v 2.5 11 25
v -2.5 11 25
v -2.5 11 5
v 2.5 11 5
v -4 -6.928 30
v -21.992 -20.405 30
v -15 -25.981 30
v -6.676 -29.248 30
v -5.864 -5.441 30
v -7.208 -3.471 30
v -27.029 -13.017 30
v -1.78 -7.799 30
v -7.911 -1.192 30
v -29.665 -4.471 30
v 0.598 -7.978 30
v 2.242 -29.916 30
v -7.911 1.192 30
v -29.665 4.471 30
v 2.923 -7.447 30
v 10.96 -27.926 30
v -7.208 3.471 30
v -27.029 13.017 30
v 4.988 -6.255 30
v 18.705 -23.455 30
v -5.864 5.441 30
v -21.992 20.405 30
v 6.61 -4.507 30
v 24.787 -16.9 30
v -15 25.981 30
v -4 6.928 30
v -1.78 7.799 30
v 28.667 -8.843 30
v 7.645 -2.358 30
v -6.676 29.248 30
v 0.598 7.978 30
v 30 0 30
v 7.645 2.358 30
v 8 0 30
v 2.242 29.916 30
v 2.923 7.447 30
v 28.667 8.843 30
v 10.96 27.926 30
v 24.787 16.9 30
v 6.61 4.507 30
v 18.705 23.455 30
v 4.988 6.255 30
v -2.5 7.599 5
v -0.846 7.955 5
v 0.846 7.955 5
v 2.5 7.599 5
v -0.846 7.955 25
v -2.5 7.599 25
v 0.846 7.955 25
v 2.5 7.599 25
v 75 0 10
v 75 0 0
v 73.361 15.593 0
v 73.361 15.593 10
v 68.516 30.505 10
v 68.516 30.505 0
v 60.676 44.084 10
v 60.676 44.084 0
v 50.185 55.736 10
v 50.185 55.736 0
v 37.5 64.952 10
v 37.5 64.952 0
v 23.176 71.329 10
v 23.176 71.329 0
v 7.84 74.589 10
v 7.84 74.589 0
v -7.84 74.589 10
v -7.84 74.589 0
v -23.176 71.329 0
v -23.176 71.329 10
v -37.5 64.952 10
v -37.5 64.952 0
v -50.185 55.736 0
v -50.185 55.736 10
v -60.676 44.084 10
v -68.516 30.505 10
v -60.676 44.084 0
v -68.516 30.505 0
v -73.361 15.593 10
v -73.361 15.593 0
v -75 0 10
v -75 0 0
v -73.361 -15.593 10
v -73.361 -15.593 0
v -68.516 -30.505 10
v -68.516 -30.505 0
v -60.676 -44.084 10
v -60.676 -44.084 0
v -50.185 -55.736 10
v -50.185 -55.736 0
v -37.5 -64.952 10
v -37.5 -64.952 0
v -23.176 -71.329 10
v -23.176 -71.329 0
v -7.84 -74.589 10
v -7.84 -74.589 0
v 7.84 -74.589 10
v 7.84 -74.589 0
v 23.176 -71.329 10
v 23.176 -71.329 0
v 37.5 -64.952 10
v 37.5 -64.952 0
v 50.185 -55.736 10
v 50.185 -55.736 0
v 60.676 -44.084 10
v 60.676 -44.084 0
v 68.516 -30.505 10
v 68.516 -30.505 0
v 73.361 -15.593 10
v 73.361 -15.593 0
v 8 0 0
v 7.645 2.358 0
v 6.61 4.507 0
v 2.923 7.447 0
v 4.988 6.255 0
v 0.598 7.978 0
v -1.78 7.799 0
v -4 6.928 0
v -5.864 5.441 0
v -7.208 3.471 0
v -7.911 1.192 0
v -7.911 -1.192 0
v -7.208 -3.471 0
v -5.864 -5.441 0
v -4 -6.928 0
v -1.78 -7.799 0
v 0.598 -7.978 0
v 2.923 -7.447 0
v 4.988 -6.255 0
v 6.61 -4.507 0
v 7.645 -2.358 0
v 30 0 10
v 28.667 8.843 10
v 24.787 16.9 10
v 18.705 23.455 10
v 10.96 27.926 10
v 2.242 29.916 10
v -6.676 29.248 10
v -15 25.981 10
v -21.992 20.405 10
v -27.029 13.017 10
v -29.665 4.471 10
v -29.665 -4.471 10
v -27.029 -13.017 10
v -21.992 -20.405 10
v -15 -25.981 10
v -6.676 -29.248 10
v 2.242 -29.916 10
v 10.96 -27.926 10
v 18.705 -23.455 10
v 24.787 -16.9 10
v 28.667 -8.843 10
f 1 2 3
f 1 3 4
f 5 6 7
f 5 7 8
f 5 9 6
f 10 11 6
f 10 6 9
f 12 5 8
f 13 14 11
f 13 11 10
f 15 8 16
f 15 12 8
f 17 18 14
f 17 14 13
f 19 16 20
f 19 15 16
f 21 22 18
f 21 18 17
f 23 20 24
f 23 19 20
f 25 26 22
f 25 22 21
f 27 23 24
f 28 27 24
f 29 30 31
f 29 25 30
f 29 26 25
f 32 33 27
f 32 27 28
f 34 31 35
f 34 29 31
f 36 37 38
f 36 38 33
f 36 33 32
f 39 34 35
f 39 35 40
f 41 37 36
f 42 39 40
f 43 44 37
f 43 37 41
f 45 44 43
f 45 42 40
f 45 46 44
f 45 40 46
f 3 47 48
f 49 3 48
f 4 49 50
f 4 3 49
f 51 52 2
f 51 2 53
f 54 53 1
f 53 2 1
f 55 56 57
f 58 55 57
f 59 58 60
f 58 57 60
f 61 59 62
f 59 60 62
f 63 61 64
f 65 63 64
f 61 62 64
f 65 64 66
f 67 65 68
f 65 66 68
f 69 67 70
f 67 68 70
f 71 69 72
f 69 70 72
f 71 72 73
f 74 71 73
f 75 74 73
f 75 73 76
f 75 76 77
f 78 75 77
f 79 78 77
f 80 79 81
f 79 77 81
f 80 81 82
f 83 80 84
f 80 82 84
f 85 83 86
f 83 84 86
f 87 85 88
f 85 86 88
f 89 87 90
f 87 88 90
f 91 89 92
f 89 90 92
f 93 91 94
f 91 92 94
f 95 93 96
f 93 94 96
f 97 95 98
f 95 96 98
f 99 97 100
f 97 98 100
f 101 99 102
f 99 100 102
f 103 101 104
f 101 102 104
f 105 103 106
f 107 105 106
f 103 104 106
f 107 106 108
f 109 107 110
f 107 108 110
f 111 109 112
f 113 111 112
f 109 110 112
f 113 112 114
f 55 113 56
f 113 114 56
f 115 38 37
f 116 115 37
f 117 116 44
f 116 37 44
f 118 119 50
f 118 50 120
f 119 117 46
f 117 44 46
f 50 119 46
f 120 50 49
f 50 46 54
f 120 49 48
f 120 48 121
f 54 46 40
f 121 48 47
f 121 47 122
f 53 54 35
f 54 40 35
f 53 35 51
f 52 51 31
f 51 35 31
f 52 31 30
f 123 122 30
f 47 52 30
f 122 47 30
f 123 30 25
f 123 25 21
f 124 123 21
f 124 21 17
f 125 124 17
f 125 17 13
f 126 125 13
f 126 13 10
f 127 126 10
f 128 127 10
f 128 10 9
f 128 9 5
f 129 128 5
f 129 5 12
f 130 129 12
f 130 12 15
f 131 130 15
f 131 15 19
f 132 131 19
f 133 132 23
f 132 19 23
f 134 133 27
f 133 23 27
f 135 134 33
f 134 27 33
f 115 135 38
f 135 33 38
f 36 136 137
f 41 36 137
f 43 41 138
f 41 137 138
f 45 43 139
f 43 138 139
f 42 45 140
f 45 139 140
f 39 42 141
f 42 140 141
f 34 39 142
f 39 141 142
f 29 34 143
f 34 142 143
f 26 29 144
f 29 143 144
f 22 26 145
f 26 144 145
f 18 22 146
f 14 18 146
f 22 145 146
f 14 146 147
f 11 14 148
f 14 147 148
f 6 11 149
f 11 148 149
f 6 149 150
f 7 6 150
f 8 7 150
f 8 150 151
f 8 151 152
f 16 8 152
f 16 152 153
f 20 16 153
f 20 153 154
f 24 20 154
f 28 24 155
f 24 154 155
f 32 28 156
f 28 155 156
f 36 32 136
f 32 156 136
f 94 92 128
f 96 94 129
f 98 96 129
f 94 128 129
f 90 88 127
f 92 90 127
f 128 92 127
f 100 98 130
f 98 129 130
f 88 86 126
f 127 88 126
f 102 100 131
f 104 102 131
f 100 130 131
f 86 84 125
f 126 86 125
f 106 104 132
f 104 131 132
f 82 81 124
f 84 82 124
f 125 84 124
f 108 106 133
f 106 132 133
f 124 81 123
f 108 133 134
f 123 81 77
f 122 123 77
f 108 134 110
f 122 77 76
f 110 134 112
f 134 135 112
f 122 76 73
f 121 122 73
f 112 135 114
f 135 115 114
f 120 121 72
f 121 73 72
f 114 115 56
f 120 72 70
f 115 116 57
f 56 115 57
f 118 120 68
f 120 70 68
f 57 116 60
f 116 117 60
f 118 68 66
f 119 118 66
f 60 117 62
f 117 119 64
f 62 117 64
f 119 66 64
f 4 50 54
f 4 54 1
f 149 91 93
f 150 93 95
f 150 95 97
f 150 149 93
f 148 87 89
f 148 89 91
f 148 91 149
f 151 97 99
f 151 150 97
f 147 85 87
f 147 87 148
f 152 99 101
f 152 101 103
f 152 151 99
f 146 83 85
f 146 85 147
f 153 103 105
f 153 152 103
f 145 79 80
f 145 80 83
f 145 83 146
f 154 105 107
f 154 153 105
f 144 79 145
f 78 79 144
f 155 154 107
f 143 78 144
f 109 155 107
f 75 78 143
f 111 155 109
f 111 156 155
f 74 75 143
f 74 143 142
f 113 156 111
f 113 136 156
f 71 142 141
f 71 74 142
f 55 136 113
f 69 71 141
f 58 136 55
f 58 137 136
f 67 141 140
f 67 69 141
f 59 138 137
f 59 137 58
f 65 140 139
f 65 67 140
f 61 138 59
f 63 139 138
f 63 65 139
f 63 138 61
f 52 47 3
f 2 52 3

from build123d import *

# Parameters (mm, degrees)
SKETCH1_R           = 75
BOSS_EXTRUDE1_DEPTH = 10
SKETCH2_R           = 30
BOSS_EXTRUDE2_DEPTH = 20
SKETCH3_R           = 8
CUT_EXTRUDE1_DEPTH  = 111.227038425
CUT_EXTRUDE2_START  = -5
SKETCH4_W           = 5
SKETCH4_H           = 6
CUT_EXTRUDE2_DEPTH  = 20


with BuildPart() as part:
    # Sketch1 → Boss-Extrude1 (new body)
    with BuildSketch(Plane.XY):
        Circle(SKETCH1_R)
    extrude(amount=BOSS_EXTRUDE1_DEPTH)

    # Sketch2 → Boss-Extrude2 (add)
    with BuildSketch(Plane.XY.offset(10)):
        Circle(SKETCH2_R)
    extrude(amount=BOSS_EXTRUDE2_DEPTH)

    # Sketch3 → Cut-Extrude1 (cut, through all)
    with BuildSketch(Plane.XY.offset(30)):
        Circle(SKETCH3_R)
    extrude(amount=-CUT_EXTRUDE1_DEPTH, mode=Mode.SUBTRACT)

    # Sketch4 → Cut-Extrude2 (cut)
    with BuildSketch(Plane.XY.offset(30).offset(CUT_EXTRUDE2_START)):
        with Locations((0, 8)):
            Rectangle(SKETCH4_W, SKETCH4_H)
    extrude(amount=-CUT_EXTRUDE2_DEPTH, mode=Mode.SUBTRACT)


solid = part.part
